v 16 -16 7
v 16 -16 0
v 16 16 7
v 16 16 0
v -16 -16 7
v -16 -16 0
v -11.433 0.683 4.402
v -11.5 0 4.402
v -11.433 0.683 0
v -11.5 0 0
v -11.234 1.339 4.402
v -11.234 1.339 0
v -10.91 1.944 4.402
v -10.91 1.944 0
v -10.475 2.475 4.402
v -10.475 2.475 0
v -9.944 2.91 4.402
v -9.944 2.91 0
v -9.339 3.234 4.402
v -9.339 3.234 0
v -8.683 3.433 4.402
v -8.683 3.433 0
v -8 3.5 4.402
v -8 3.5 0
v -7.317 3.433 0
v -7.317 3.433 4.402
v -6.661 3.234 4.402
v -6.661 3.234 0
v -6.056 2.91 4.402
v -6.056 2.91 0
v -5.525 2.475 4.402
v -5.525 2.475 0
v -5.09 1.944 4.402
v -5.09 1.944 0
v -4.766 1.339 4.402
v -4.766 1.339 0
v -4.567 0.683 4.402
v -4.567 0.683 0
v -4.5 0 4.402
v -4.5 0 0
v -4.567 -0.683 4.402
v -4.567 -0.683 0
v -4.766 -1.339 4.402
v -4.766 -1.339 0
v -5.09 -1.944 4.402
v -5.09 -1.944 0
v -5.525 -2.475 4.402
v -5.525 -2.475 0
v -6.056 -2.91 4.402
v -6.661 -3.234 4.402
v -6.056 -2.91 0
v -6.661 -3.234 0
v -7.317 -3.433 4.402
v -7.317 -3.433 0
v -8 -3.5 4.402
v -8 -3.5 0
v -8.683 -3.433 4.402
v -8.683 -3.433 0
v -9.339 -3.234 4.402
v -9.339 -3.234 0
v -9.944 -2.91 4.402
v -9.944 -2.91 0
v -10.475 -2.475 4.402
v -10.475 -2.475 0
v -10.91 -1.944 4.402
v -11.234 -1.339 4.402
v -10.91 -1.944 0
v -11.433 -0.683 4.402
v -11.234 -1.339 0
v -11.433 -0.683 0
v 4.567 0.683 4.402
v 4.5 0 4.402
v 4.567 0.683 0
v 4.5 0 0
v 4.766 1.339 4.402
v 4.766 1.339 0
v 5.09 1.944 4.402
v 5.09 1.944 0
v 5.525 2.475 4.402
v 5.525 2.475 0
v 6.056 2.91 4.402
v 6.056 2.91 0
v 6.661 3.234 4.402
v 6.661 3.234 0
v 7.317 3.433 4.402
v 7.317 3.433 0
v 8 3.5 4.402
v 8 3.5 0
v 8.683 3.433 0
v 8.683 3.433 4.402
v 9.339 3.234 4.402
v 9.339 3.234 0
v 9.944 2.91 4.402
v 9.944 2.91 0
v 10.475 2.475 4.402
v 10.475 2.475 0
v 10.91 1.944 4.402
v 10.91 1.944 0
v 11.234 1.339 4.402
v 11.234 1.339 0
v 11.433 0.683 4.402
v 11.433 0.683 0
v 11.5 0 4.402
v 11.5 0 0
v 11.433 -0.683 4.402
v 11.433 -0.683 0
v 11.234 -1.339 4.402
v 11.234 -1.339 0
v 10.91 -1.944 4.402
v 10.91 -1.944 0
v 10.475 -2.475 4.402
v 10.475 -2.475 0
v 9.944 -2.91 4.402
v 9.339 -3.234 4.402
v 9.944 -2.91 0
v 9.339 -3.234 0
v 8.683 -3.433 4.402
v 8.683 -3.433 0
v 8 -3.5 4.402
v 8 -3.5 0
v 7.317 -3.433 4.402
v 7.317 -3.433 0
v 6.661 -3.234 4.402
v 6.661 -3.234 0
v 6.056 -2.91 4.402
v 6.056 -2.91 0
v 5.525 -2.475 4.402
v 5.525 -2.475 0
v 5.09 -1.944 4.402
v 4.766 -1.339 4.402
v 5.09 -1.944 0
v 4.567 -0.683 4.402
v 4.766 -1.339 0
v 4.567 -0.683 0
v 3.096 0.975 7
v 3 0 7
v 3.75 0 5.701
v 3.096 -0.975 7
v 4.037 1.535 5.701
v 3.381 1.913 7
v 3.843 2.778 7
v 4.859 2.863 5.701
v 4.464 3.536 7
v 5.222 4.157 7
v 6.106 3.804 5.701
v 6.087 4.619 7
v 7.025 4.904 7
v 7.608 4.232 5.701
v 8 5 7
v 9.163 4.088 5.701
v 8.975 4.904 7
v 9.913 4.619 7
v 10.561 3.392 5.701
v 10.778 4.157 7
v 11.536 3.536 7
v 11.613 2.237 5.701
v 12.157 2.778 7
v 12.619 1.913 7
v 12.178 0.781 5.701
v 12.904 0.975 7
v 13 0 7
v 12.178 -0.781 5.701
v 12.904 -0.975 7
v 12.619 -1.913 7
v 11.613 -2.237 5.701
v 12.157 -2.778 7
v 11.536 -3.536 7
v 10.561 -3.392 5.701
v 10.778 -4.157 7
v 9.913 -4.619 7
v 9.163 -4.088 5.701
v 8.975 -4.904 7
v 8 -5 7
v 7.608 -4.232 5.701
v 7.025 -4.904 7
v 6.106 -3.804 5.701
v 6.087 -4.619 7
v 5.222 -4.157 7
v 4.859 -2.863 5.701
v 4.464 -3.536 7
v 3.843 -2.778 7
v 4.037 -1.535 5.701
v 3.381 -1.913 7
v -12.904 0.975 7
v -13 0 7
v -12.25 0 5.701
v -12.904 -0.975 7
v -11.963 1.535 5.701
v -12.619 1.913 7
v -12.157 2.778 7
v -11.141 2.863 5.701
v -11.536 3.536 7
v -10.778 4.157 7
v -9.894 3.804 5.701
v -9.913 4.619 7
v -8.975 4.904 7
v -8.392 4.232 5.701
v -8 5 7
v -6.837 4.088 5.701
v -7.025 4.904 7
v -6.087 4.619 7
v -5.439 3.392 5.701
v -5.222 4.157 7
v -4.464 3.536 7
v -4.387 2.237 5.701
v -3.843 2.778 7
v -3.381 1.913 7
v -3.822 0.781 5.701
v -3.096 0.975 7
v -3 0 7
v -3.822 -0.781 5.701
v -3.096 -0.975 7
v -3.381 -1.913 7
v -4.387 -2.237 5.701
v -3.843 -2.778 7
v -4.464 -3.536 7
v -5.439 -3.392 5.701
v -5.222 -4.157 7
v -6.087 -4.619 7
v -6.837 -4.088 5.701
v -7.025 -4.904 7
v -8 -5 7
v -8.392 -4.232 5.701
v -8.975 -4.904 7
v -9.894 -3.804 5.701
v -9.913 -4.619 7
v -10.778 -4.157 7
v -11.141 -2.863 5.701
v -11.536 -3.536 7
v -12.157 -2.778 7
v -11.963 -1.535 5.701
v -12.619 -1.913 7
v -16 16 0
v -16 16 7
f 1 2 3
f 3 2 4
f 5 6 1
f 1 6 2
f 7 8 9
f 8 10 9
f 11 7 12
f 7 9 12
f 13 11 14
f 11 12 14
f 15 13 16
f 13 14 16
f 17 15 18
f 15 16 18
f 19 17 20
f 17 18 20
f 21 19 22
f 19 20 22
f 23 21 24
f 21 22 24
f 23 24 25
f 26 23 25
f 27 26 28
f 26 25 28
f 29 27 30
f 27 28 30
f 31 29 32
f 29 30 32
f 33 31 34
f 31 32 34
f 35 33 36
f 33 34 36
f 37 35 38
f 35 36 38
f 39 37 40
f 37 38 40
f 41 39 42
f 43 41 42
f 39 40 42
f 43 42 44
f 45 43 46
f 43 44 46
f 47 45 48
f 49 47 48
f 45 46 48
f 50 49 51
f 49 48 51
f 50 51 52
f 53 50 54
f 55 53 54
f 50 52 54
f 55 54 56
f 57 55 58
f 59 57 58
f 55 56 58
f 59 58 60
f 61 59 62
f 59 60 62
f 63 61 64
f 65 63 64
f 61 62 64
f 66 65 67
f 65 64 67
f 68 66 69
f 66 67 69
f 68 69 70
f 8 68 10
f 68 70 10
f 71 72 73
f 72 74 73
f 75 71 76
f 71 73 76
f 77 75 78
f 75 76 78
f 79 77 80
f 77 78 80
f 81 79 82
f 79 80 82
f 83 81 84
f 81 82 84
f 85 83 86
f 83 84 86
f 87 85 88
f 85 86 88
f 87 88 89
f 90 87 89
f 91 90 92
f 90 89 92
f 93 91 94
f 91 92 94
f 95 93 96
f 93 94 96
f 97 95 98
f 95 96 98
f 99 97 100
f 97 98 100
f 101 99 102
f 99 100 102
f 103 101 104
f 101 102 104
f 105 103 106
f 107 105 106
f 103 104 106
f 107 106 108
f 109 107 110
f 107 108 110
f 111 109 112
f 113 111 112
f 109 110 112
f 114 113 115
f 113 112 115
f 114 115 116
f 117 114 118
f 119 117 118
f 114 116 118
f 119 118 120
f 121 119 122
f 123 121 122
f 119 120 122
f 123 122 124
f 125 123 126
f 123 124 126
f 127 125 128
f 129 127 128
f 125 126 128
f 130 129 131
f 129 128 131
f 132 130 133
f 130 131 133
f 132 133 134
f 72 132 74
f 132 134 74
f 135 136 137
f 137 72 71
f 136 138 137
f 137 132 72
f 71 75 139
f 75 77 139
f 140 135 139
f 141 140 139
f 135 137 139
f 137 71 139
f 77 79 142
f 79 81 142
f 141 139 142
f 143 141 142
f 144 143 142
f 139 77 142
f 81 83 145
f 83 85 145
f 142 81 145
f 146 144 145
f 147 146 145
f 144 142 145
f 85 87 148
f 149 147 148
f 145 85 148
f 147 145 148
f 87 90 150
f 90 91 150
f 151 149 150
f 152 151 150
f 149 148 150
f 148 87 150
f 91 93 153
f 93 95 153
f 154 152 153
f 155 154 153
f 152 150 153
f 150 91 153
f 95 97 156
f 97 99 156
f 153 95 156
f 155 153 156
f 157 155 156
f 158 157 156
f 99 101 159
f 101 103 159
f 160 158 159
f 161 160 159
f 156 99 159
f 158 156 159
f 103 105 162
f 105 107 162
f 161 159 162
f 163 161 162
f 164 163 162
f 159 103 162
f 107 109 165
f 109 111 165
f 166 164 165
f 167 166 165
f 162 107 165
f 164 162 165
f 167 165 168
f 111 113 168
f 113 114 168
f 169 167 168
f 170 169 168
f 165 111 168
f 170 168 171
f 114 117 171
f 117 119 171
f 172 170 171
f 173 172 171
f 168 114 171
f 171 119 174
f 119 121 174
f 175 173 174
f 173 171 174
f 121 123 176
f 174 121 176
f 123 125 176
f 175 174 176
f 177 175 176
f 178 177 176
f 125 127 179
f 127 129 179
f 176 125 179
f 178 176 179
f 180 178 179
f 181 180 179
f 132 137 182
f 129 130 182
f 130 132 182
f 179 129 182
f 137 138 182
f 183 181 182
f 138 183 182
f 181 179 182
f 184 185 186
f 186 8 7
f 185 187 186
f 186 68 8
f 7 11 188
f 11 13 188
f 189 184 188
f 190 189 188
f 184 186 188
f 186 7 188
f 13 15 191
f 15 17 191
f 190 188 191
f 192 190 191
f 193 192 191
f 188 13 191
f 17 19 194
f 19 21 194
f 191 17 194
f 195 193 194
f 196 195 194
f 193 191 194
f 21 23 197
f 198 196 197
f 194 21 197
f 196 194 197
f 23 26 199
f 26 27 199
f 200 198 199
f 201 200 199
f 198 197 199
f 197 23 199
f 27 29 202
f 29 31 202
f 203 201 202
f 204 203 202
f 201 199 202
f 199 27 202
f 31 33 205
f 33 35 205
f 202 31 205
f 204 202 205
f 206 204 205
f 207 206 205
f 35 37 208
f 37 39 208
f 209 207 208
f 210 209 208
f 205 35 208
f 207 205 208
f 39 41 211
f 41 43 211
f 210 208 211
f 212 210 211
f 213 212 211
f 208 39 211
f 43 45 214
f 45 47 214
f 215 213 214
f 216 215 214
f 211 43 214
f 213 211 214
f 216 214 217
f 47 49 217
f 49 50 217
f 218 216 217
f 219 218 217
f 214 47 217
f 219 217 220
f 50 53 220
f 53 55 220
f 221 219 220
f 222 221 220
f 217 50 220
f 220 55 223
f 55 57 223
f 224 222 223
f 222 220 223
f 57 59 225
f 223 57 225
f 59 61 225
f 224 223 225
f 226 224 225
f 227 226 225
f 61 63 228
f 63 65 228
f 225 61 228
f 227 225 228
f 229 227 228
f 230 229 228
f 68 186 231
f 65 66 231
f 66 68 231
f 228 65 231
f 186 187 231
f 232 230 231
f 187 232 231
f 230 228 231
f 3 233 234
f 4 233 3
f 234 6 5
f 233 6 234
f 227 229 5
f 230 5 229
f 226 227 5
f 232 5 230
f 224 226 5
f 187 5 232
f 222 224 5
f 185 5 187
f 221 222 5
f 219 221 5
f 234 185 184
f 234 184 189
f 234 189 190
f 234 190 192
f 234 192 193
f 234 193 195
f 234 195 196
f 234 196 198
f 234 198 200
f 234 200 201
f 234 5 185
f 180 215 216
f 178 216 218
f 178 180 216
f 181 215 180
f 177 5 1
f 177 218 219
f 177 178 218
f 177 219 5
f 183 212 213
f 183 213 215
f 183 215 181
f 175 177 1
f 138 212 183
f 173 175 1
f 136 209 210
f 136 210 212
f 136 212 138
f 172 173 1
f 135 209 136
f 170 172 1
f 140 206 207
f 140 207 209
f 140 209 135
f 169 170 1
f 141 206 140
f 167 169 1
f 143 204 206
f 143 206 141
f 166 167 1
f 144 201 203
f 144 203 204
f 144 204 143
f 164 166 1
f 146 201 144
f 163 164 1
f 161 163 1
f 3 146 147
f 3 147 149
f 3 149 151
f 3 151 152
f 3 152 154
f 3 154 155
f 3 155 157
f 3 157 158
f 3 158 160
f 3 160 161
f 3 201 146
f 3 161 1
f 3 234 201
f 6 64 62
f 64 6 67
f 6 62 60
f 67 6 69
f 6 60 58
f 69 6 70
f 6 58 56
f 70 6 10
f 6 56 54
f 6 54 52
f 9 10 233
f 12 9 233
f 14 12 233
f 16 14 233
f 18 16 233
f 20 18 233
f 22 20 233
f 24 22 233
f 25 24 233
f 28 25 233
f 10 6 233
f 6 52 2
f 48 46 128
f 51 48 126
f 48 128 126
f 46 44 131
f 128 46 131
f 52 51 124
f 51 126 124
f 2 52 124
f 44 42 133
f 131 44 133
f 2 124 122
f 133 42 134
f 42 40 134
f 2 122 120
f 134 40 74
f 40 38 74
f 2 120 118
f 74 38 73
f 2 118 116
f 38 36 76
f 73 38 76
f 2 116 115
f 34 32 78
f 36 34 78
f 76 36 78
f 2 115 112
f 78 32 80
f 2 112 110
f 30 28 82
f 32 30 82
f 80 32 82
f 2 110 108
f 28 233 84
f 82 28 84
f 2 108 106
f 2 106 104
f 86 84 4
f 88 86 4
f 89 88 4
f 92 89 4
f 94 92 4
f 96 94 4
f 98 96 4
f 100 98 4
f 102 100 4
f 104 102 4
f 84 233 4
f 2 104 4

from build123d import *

# Parameters (mm, degrees)
F0_W           = 32
F0_H           = 32
F1_DEPTH       = 7
F3_D           = 7
F3_CSINK_D     = 10
F3_CSINK_ANGLE = 60


with BuildPart() as f1:
    # F0 (on Top) → F1 (new body)
    with BuildSketch(Plane.XY):
        Rectangle(F0_W, F0_H)
    extrude(amount=F1_DEPTH)

    # F3 (through all)
    with Locations(Plane.XY.offset(7)):
        with Locations((-8, 0), (8, 0)):
            CounterSinkHole(F3_D / 2, F3_CSINK_D / 2, counter_sink_angle=F3_CSINK_ANGLE)


solid = f1.part
